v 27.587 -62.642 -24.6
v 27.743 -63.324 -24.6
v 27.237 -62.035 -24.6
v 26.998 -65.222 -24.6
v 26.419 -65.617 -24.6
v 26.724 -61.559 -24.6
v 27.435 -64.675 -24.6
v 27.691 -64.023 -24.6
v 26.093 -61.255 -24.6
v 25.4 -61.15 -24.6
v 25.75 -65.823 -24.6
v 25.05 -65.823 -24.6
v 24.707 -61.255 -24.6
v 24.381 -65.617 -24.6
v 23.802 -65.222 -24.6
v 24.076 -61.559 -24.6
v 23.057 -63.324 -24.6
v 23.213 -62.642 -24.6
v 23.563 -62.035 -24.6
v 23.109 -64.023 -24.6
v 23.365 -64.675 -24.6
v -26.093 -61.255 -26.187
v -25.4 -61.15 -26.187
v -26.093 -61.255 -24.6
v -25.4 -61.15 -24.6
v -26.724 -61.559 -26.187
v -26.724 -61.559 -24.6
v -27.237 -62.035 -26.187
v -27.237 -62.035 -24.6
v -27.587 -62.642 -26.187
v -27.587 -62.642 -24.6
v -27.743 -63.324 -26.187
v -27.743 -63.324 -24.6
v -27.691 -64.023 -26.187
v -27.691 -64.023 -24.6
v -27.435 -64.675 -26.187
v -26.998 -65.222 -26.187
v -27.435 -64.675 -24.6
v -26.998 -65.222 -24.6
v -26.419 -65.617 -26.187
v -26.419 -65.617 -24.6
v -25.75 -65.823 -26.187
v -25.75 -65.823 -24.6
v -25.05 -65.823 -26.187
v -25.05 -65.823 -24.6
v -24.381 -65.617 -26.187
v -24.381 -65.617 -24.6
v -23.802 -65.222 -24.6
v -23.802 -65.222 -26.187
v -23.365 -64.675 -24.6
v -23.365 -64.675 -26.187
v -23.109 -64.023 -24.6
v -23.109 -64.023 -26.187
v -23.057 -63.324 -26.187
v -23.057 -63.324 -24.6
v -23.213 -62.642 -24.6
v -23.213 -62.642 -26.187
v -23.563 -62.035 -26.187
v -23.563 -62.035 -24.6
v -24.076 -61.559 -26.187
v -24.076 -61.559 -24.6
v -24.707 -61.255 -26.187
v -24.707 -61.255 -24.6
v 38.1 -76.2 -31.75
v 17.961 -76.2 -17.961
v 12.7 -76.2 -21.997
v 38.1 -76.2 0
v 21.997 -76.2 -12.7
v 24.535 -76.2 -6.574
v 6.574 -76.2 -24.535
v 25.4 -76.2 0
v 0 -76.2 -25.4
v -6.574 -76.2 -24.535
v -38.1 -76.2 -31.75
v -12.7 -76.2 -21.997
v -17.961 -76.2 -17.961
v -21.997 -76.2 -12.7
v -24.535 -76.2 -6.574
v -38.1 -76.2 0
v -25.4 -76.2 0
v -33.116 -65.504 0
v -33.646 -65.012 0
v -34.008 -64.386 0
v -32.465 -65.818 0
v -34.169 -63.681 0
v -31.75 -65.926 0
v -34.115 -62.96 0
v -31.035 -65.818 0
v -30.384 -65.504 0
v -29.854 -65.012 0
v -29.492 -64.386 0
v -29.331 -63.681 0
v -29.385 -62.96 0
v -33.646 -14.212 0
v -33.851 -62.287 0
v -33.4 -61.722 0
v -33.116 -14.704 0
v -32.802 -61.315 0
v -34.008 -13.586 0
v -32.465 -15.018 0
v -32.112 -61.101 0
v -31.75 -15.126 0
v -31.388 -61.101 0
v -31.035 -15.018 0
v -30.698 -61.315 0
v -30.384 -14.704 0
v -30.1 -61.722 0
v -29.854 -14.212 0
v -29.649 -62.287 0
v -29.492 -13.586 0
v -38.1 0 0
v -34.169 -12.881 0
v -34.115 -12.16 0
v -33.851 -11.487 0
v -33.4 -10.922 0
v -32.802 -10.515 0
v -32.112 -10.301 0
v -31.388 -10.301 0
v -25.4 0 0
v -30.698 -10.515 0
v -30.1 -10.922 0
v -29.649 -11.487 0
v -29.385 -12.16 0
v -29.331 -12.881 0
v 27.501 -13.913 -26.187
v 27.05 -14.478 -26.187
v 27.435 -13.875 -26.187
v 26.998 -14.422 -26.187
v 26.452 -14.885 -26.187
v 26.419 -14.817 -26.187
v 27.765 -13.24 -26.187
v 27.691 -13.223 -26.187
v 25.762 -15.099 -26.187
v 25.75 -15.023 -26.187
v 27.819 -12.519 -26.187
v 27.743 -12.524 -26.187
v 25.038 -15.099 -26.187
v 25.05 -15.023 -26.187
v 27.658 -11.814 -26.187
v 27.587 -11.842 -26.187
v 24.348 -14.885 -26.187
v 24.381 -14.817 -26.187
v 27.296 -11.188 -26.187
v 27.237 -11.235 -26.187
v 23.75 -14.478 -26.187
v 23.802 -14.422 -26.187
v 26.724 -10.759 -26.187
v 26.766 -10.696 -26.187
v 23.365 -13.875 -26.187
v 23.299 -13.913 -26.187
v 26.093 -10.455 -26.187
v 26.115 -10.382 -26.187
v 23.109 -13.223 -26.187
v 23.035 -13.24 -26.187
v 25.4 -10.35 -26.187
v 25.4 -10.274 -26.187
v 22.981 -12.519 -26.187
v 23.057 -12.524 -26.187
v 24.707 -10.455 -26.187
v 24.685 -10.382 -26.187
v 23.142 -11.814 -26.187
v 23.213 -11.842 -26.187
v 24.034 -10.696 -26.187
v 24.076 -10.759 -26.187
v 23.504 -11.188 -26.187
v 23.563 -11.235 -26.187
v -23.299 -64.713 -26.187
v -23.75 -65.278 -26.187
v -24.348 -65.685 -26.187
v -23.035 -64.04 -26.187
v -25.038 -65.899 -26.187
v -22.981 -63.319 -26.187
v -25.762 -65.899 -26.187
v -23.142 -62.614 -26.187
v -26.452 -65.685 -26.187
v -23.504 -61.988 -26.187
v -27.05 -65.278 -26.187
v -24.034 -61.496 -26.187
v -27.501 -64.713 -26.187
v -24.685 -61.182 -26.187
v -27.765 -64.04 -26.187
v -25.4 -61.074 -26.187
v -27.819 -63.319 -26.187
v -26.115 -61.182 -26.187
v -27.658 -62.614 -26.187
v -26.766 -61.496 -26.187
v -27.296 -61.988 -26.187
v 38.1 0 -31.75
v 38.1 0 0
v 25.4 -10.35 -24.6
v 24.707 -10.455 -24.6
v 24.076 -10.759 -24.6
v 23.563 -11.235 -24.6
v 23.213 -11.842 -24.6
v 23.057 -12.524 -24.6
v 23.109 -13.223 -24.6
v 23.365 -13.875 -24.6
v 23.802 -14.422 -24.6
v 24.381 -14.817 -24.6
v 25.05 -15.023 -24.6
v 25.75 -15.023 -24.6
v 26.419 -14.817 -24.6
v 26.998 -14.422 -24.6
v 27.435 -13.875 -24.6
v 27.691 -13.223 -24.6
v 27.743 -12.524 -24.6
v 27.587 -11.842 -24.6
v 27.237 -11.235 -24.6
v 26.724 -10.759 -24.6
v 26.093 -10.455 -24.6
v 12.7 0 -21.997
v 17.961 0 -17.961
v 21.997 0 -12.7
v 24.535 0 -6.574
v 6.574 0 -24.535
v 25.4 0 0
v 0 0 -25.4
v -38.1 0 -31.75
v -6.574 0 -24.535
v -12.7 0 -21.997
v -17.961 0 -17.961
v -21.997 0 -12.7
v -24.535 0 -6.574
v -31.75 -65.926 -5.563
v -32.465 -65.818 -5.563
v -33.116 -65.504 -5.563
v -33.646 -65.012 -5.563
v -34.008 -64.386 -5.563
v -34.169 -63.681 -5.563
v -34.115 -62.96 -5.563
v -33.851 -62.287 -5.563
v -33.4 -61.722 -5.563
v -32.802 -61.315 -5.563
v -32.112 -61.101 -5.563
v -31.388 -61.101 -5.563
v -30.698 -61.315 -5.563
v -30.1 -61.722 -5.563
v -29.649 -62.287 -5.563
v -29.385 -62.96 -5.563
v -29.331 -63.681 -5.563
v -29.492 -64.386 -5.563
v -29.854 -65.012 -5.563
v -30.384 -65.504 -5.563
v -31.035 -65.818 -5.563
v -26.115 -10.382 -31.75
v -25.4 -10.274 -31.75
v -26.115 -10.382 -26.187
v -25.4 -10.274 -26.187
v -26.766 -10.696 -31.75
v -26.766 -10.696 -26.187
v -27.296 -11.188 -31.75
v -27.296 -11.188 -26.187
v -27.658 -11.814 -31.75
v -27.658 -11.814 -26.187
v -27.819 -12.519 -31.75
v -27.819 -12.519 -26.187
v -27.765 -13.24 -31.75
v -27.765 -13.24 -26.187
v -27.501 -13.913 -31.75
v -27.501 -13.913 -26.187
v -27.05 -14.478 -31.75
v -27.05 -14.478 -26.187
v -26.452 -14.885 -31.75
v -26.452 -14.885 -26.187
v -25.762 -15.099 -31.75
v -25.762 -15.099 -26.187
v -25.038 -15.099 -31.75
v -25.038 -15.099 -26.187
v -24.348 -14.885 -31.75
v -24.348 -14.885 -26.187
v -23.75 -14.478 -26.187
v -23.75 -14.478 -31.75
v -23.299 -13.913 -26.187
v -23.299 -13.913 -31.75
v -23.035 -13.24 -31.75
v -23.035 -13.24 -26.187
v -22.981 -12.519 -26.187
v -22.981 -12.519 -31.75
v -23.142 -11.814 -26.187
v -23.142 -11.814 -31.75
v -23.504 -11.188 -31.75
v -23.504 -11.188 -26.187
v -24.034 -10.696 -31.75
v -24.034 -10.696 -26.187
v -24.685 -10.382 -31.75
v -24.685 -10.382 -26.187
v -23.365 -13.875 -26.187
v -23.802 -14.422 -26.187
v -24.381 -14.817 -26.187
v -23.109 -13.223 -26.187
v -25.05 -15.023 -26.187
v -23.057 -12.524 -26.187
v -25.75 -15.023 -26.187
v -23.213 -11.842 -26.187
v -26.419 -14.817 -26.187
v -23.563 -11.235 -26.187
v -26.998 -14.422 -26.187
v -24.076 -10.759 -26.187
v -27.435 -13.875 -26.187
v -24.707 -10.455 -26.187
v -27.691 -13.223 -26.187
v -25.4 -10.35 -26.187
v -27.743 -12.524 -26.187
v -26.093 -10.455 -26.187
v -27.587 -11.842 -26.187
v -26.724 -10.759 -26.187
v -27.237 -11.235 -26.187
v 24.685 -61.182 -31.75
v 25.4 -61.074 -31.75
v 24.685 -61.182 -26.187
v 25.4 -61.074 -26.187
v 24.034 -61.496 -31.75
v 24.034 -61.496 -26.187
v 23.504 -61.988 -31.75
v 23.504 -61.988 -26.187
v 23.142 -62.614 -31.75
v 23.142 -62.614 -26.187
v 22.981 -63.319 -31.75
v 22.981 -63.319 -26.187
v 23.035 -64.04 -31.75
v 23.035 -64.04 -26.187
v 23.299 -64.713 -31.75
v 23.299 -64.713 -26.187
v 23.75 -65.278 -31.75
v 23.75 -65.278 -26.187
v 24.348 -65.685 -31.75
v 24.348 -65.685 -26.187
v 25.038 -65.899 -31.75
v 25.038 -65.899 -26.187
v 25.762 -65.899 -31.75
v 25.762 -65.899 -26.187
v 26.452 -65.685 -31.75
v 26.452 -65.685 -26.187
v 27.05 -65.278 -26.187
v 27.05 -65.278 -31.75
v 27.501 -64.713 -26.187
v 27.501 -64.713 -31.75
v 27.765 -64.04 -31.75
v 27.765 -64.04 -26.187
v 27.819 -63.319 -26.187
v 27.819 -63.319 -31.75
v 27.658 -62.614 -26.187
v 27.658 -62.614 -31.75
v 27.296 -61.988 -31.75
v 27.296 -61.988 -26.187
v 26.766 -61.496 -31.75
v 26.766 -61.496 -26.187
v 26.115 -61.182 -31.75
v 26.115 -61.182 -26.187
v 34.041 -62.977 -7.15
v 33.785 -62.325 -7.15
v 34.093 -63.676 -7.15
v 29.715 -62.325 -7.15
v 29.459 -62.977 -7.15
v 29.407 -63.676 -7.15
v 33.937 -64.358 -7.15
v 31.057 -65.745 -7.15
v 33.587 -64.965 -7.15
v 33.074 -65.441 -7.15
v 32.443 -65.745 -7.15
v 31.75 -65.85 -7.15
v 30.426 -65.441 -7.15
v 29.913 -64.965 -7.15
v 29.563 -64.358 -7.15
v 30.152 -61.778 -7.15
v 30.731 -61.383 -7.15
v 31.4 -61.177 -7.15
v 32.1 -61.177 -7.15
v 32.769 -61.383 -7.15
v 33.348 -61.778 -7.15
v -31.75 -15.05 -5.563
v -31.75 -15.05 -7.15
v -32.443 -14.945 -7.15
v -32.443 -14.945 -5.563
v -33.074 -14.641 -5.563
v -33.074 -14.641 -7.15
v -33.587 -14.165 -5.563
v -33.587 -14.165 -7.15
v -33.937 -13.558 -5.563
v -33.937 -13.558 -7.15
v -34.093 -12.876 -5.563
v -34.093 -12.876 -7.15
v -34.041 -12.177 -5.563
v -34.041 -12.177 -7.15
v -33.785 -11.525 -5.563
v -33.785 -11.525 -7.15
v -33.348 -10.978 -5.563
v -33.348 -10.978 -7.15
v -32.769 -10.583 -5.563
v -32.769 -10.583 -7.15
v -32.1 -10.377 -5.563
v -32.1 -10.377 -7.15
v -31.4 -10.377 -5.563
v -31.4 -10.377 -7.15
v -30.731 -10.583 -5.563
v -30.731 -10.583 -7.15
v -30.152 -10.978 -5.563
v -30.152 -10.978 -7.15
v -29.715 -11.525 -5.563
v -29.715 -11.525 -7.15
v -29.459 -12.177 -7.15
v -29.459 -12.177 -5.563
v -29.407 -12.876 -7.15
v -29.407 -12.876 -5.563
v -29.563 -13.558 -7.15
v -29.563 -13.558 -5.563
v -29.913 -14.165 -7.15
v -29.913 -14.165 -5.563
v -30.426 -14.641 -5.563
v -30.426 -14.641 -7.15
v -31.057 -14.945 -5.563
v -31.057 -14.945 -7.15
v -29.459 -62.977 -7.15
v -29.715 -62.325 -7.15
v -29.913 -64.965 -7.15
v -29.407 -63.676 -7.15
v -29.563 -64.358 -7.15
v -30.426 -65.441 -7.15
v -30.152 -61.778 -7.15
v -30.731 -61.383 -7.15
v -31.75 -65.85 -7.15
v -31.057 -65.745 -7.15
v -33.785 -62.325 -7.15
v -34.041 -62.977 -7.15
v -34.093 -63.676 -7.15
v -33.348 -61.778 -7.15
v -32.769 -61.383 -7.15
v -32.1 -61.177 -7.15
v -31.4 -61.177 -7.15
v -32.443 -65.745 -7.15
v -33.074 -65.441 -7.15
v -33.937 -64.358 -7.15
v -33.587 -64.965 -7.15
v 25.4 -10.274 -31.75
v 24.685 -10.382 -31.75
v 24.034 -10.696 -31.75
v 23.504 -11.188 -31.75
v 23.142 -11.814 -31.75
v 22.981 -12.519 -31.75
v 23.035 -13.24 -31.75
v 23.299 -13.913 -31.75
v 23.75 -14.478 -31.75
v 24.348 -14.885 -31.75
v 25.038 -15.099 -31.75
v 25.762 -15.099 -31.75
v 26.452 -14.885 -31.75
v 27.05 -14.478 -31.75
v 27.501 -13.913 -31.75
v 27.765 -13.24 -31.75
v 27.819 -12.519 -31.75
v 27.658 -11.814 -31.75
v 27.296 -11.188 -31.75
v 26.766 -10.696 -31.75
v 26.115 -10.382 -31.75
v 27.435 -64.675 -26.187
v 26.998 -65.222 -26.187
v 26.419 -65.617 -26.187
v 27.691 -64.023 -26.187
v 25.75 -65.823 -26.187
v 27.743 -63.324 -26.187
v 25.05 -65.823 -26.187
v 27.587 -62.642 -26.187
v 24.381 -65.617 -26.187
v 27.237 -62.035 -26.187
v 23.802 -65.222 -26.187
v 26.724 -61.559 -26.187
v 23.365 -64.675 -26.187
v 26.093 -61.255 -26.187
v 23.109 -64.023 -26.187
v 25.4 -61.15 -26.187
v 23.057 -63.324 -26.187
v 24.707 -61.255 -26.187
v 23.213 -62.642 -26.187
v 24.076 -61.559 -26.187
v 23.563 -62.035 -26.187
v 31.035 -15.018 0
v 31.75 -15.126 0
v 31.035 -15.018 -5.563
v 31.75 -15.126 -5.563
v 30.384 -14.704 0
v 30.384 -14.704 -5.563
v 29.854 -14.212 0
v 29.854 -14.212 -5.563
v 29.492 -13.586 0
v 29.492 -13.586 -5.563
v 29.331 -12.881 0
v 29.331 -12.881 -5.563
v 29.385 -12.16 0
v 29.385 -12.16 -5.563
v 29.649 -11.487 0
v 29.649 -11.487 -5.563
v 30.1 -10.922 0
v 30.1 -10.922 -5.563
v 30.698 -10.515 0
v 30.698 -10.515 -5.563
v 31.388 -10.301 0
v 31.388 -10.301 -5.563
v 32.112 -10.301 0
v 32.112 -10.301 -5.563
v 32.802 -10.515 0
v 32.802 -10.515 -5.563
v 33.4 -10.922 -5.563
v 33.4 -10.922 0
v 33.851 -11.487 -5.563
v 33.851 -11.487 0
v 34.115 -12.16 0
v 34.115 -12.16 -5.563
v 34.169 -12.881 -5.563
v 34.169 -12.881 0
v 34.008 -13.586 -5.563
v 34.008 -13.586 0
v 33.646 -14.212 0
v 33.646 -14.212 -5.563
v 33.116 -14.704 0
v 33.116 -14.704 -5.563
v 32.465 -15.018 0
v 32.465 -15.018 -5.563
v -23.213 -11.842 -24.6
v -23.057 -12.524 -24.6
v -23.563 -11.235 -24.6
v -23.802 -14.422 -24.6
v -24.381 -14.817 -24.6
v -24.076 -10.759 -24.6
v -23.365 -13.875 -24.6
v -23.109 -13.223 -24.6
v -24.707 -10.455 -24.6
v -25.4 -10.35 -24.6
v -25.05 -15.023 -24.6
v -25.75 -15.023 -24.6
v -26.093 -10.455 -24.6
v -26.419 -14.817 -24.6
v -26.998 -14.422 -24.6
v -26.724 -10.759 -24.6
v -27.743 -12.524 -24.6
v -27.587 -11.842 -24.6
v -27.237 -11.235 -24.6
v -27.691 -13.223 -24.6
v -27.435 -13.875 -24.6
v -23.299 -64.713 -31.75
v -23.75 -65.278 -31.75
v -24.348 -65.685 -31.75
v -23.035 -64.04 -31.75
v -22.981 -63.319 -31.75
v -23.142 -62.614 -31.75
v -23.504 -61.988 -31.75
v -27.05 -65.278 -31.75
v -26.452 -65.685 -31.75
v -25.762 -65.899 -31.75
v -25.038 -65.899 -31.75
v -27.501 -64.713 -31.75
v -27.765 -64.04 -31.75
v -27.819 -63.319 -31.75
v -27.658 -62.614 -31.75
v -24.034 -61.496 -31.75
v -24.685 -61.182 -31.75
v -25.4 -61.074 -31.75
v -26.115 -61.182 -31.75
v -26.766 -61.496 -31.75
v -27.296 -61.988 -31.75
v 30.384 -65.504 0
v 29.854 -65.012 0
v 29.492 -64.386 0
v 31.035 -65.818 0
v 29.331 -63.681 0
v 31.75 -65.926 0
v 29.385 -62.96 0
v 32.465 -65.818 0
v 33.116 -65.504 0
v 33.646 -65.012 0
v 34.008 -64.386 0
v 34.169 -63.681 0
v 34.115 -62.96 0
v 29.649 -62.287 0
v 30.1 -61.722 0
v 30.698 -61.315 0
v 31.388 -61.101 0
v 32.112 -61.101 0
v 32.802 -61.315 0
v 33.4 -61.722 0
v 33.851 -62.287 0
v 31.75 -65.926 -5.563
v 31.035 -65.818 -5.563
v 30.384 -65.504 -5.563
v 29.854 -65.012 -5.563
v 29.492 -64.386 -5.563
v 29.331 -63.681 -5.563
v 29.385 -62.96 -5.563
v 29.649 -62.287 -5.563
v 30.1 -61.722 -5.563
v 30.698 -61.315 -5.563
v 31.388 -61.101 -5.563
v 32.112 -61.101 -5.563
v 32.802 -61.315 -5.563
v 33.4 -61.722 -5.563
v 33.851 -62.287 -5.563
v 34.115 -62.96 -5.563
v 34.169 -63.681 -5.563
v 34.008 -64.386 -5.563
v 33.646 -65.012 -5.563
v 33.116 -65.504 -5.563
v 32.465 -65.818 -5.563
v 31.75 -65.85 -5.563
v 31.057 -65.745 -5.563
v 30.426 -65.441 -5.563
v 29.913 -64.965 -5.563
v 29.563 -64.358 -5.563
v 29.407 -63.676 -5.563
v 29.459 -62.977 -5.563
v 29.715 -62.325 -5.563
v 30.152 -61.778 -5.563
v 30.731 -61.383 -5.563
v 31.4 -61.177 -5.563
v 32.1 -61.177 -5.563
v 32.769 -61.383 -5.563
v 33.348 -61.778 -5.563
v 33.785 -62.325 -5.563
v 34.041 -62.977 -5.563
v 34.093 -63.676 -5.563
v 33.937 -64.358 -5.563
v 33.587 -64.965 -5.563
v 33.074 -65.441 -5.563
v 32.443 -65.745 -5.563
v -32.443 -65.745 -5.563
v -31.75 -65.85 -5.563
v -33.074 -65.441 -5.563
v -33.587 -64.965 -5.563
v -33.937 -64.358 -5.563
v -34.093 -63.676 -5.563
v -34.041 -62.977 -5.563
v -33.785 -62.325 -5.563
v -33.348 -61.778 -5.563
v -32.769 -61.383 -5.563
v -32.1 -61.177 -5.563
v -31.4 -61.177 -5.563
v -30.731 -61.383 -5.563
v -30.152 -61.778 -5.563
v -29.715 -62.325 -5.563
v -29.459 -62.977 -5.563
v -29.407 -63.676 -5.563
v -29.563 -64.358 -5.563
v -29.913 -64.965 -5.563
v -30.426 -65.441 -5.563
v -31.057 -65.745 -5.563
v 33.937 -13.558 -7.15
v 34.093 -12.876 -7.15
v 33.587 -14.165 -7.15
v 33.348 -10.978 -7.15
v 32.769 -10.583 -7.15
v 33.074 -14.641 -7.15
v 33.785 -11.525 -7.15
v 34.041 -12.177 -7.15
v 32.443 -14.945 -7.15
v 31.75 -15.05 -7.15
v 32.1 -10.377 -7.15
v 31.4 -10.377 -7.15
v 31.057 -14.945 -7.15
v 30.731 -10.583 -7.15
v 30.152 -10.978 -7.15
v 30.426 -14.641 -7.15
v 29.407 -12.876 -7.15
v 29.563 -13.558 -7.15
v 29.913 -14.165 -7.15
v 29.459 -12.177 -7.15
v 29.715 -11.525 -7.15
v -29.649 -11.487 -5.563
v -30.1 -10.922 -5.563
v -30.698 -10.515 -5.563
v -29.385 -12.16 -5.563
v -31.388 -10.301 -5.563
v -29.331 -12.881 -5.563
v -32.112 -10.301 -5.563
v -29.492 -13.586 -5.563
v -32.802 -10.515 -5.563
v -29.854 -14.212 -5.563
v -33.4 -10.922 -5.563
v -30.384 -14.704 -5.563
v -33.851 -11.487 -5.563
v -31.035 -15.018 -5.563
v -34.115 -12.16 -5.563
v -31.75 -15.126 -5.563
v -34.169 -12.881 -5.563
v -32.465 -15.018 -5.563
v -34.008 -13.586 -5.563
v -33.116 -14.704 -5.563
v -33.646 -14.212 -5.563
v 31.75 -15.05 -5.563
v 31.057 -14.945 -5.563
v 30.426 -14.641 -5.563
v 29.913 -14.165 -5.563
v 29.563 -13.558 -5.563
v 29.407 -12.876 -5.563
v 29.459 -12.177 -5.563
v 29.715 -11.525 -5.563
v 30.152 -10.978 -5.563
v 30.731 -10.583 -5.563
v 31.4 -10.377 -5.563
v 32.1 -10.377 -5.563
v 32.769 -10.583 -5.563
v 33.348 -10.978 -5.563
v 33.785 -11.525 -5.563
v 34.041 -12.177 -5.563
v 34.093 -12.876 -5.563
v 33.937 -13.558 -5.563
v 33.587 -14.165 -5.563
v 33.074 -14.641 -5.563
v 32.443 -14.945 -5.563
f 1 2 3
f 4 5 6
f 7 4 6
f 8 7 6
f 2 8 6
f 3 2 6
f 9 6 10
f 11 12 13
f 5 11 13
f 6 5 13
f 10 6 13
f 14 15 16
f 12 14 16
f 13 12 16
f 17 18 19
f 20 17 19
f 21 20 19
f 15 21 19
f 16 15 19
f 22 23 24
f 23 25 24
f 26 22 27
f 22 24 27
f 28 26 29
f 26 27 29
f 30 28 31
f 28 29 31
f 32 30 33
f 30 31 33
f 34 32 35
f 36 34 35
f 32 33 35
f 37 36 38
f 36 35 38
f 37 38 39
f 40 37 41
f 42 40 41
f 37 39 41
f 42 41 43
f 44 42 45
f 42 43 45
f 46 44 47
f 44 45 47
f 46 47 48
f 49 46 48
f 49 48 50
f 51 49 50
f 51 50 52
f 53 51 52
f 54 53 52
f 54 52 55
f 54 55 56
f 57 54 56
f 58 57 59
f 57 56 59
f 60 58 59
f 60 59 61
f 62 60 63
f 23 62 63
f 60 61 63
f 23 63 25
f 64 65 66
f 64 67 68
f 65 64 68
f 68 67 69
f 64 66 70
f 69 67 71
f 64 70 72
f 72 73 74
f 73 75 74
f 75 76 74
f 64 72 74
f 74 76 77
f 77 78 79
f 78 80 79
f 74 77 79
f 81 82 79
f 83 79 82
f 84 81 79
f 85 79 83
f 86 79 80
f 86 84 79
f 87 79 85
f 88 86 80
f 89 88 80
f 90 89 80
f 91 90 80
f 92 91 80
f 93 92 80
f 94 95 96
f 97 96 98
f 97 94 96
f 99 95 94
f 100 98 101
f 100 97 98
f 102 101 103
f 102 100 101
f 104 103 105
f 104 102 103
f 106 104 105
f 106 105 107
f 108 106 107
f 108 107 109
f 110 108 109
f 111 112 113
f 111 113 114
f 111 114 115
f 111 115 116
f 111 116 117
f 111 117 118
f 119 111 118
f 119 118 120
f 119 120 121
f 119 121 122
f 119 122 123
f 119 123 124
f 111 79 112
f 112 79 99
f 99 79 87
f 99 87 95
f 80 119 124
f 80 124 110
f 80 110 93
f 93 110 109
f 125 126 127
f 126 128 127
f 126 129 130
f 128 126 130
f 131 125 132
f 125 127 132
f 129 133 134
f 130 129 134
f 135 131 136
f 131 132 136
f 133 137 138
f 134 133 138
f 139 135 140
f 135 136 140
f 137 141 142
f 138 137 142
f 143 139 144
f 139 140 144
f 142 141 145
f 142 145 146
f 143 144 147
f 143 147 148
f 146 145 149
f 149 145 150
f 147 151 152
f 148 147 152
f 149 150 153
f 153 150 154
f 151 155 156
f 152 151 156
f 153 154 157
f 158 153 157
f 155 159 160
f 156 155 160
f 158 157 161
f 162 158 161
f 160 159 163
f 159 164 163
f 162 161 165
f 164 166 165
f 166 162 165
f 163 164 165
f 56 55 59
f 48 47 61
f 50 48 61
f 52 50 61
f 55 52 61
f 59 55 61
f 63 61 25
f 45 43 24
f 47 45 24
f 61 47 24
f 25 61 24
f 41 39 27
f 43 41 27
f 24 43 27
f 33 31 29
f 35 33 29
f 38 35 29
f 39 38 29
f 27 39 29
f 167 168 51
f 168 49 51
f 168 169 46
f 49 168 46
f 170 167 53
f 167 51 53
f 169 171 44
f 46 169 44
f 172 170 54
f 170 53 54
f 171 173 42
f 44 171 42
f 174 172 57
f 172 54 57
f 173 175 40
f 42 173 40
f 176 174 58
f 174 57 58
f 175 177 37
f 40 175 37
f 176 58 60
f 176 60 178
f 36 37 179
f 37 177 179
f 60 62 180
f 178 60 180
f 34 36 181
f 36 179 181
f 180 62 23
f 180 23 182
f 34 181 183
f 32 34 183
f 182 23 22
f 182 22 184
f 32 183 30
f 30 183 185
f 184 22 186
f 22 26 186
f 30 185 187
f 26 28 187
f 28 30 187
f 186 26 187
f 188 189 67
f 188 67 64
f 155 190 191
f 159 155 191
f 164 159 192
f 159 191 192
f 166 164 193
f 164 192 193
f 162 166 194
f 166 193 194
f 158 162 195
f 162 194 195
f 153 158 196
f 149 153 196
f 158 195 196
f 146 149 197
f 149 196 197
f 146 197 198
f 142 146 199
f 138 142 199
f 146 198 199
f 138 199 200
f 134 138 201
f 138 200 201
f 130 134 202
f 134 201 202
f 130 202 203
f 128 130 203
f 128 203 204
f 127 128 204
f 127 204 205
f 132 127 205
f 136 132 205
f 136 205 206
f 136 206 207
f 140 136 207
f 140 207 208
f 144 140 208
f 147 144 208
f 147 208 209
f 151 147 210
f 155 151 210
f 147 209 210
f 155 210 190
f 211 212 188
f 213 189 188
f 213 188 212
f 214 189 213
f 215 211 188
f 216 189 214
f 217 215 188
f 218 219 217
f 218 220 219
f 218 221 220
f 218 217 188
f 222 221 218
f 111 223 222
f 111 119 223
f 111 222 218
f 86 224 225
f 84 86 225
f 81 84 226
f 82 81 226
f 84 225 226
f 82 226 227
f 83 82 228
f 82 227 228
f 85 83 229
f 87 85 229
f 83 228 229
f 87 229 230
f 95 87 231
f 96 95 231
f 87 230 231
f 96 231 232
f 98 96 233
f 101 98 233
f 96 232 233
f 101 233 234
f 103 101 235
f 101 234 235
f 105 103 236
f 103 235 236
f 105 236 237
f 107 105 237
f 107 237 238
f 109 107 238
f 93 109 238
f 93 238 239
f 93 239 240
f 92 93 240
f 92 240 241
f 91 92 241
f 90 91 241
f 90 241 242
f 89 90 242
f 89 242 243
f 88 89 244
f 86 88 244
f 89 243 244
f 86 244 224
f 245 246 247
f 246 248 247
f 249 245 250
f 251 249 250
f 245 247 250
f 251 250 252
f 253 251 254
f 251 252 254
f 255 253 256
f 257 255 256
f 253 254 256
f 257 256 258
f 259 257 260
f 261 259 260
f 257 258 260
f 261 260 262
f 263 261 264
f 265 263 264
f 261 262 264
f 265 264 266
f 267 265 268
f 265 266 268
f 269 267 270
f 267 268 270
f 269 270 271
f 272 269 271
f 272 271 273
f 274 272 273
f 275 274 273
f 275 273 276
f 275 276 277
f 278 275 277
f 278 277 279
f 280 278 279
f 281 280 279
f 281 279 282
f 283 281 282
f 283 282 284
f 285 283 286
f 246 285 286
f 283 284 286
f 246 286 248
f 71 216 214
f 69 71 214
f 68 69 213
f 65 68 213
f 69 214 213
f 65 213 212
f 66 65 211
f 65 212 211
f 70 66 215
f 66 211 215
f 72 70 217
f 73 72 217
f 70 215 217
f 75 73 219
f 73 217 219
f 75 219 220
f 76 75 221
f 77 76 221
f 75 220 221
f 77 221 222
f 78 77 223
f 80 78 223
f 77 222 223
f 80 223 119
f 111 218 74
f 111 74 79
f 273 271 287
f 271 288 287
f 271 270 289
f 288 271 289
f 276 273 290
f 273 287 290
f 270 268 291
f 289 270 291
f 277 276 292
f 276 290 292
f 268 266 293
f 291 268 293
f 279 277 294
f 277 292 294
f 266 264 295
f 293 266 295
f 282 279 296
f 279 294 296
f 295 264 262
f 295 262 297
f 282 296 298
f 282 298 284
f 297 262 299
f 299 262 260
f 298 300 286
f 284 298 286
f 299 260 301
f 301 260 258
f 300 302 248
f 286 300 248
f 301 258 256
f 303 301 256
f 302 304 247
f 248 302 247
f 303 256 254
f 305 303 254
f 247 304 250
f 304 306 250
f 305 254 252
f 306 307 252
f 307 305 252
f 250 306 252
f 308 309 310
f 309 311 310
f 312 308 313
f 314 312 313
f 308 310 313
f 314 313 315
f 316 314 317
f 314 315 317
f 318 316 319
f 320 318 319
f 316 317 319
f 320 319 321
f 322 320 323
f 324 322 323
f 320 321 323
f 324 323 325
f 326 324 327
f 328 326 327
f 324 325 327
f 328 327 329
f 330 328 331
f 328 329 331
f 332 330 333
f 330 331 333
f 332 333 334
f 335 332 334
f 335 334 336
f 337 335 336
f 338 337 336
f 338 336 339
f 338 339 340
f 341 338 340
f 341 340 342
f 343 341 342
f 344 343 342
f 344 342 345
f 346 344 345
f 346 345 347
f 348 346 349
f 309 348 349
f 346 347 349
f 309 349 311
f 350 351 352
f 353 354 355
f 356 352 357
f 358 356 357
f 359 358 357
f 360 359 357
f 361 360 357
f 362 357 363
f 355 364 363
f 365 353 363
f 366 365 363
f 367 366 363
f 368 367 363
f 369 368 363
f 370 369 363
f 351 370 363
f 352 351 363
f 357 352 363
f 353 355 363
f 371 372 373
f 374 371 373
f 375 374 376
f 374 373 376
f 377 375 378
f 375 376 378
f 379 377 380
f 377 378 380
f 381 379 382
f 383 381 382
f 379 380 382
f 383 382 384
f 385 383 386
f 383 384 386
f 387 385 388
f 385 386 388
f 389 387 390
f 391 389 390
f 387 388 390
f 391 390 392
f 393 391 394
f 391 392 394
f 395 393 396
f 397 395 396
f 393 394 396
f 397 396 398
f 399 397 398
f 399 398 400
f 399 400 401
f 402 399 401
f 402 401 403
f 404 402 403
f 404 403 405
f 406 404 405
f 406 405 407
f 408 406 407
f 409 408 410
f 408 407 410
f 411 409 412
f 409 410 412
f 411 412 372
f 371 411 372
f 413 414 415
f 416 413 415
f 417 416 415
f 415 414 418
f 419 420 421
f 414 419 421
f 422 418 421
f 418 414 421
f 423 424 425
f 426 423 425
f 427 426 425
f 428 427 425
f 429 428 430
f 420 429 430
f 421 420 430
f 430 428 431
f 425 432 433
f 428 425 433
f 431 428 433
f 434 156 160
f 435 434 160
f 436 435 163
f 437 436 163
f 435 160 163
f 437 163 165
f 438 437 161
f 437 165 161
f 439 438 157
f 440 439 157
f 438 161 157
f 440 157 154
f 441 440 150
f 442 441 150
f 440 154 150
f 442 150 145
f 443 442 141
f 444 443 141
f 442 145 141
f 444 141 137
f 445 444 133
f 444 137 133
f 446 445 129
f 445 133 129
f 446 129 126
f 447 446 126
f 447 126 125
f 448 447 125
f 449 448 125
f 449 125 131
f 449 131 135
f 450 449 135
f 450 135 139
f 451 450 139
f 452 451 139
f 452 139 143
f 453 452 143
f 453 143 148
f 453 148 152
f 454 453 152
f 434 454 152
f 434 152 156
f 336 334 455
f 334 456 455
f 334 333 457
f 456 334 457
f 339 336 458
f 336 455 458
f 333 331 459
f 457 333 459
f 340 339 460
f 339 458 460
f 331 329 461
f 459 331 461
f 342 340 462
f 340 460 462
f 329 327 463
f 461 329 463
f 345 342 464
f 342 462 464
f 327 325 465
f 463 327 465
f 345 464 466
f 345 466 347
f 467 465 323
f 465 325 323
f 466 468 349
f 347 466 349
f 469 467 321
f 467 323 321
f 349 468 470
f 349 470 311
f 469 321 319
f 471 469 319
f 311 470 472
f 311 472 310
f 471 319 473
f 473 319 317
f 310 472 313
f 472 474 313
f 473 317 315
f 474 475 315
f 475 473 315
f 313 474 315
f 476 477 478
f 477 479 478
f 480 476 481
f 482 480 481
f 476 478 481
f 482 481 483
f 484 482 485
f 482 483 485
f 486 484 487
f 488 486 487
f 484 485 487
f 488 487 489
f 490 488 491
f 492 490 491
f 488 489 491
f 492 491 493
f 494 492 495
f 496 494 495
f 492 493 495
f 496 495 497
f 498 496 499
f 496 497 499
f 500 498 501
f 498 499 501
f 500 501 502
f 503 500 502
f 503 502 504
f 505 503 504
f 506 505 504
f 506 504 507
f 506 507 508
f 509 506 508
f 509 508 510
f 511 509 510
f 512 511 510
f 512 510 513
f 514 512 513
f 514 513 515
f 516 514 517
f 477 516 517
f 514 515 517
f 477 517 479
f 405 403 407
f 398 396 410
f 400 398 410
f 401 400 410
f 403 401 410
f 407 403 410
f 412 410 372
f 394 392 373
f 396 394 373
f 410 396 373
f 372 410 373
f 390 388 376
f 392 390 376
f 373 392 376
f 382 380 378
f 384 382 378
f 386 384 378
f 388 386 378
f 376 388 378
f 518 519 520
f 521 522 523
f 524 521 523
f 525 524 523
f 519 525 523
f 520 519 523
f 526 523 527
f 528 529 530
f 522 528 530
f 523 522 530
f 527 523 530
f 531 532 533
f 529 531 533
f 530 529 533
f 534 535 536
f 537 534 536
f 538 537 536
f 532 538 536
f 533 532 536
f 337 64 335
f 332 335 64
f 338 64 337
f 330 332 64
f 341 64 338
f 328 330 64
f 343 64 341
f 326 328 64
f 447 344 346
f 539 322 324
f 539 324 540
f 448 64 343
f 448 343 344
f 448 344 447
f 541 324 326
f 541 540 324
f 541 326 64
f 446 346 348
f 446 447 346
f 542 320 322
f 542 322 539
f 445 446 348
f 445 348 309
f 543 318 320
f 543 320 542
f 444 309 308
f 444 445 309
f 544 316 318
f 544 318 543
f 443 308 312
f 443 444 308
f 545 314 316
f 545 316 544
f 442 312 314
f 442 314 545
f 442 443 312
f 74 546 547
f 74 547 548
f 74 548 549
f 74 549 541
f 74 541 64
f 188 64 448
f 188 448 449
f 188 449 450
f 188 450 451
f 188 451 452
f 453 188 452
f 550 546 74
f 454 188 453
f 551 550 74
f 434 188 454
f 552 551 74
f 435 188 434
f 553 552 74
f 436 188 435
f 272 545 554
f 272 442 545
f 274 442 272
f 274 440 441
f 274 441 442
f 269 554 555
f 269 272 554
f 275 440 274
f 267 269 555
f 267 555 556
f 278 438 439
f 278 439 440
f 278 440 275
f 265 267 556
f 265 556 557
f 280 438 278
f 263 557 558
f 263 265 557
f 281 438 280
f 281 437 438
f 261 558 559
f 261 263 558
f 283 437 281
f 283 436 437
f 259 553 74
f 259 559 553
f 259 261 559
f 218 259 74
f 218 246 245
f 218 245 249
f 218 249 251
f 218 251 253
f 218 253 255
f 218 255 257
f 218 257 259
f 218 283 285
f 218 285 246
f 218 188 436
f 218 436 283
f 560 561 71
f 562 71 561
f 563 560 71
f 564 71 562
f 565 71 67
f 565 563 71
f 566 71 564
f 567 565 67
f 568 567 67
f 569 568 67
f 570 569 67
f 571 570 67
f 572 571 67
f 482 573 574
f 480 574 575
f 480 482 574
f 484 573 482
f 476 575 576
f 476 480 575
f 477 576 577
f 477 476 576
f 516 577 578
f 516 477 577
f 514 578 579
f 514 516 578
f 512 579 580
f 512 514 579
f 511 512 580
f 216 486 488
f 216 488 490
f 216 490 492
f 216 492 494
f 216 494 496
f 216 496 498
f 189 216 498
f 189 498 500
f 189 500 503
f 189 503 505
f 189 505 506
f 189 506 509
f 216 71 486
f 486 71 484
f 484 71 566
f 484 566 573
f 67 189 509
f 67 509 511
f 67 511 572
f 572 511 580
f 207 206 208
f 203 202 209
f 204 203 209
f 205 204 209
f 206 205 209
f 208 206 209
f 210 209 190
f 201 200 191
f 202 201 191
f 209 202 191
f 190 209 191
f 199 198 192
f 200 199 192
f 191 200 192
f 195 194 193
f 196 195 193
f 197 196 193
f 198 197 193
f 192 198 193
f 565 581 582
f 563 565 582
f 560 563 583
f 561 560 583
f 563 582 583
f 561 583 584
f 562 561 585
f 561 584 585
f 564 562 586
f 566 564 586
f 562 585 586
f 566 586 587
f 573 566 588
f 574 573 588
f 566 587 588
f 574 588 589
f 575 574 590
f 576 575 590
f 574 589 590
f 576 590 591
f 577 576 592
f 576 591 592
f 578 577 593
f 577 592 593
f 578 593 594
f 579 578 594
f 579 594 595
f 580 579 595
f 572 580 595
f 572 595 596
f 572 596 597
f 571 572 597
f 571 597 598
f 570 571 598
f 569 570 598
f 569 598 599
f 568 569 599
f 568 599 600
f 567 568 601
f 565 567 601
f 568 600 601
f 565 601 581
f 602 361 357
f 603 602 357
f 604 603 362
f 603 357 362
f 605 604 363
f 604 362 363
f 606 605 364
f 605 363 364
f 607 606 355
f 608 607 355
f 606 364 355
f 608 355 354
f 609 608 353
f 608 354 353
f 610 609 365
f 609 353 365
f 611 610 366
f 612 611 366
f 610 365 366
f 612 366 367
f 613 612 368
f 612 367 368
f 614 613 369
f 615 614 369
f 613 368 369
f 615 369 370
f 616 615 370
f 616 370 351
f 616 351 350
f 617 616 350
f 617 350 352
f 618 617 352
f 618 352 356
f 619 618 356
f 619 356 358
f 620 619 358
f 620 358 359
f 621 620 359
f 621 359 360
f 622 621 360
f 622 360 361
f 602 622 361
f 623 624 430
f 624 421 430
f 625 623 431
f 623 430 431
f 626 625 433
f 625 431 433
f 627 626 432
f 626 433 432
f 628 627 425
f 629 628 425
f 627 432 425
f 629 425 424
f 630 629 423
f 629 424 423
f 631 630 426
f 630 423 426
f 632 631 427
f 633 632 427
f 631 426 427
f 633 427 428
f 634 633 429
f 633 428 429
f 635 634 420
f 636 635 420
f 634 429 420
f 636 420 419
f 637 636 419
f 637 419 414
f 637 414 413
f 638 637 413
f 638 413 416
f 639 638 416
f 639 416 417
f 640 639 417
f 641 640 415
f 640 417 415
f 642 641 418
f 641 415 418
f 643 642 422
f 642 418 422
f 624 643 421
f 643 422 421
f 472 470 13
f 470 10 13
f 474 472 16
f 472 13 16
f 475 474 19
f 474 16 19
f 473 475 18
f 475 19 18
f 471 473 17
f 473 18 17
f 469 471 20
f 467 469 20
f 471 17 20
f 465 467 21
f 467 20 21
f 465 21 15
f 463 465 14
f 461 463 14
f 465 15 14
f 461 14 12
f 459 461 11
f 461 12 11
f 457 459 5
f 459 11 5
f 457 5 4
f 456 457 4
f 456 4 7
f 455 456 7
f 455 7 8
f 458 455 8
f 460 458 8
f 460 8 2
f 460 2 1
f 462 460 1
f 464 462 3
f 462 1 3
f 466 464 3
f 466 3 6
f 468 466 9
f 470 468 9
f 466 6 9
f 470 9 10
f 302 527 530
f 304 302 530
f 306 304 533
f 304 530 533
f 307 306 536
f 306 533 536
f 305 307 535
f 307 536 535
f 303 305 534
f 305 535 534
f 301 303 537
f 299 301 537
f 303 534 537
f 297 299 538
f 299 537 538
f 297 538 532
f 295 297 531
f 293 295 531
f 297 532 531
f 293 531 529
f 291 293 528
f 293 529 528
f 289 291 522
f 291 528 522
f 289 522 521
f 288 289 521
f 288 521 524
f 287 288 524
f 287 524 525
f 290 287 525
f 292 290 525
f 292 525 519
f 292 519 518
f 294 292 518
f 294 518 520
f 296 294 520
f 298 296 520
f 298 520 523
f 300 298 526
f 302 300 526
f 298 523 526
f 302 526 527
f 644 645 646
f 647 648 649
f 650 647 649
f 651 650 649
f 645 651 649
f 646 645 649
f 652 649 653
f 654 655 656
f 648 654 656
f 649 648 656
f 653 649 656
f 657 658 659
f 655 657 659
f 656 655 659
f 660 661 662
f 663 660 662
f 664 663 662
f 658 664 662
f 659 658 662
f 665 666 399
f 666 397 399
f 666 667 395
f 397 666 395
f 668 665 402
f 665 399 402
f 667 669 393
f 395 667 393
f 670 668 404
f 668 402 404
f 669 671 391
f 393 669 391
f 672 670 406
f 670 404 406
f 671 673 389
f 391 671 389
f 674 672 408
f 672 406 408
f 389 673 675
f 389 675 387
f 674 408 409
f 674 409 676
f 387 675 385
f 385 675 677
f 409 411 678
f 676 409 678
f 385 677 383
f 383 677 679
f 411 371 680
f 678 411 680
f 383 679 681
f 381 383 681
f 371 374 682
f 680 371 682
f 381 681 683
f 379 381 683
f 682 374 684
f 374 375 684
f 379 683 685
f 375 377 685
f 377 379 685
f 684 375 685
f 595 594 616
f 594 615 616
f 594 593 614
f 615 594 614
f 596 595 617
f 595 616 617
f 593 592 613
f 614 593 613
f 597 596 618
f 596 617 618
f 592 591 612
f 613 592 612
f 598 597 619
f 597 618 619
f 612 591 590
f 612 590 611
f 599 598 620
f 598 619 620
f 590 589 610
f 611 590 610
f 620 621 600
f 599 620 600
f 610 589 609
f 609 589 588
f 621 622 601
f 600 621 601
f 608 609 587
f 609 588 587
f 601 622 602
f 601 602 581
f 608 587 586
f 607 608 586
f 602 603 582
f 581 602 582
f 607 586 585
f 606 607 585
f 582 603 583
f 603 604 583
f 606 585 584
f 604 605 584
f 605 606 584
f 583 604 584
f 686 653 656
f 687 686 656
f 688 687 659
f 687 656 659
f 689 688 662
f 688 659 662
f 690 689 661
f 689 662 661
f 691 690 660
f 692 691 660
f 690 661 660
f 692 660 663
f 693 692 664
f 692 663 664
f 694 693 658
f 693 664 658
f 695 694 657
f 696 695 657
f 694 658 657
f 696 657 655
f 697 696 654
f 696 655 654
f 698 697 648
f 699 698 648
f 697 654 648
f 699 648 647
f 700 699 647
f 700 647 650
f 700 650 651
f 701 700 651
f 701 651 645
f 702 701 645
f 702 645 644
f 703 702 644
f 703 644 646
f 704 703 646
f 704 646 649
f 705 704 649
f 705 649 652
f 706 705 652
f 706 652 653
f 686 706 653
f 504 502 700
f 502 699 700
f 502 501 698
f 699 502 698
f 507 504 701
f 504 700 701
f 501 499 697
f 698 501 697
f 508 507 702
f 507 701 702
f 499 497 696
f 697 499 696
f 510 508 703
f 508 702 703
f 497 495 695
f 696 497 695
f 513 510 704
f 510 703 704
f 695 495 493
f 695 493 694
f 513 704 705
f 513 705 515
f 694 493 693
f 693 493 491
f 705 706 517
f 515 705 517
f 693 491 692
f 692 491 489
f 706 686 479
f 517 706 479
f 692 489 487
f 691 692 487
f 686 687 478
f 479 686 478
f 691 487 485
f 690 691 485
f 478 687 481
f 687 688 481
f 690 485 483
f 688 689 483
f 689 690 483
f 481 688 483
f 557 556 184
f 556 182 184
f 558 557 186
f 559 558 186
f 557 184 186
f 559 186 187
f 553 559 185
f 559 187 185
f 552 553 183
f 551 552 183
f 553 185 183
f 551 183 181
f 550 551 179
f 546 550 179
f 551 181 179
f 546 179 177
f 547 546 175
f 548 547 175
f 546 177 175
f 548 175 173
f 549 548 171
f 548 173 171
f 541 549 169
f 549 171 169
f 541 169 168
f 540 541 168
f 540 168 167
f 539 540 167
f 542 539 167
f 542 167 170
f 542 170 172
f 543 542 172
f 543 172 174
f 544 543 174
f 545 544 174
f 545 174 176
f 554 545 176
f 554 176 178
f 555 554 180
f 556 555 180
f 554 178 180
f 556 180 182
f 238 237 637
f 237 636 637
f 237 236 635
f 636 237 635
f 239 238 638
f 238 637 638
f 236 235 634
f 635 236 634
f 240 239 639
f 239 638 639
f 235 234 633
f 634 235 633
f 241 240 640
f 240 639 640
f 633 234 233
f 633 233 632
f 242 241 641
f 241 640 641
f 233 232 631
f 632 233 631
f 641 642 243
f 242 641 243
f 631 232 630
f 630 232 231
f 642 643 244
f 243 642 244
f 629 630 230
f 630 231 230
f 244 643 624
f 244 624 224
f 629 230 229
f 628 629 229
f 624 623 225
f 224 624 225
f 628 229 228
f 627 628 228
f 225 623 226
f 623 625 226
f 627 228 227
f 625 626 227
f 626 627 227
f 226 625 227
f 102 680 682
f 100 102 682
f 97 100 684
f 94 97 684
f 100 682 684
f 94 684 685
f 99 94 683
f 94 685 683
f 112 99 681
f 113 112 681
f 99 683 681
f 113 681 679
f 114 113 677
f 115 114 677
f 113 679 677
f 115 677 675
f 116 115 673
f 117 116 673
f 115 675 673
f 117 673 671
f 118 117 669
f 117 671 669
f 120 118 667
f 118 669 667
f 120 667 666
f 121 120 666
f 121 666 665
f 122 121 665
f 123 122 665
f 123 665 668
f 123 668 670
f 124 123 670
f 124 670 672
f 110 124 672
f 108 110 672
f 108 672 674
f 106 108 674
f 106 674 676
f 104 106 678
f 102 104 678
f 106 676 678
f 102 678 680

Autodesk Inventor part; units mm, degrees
ref_plane "YZ Plane" through (0, 0, 0) normal (1, 0, 0) x (0, 1, 0)
ref_plane "XZ Plane" through (0, 0, 0) normal (0, 1, 0) x (-1, 0, 0)
ref_plane "XY Plane" through (0, 0, 0) normal (0, 0, 1) x (1, 0, 0)
sketch "Sketch18" plane through (0, 0, 0) normal (0, 1, 0) x (-1, 0, 0)
  arc A0 (-25.4, 0) -> (25.4, 0) centre (0, 0) ccw
  line L0 (-38.1, 0) -> (-38.1, -31.75)
  line L1 (-38.1, -31.75) -> (38.1, -31.75)
  line L2 (38.1, -31.75) -> (38.1, 0)
  line L3 (38.1, 31.75) -> (-38.1, -31.75) construction
  line L4 (-38.1, 31.75) -> (38.1, -31.75) construction
  line L5 (38.1, 0) -> (25.4, 0)
  line L6 (-25.4, 0) -> (-38.1, 0)
  dimension "d78" = 50.8
  dimension "d79" = 6.35
  dimension "d80" = 12.7
extrude "Extrusion9" add sketch "Sketch18" against normal blind 76.2
sketch "Sketch19" plane through (-38.1, 0, 0) normal (0, 0, 1) x (1, 0, 0)
  line L0 (0, 0) -> (0, -76.2) projected
  line L1 (12.7, 0) -> (12.7, -76.2) projected
  line L2 (63.5, 0) -> (63.5, -76.2) projected
  line L3 (76.2, 0) -> (76.2, -76.2) projected
  line L4 (76.2, -76.2) -> (63.5, -76.2) projected
  line L5 (12.7, -76.2) -> (0, -76.2) projected
  line L6 (0, 0) -> (12.7, 0) projected
  line L7 (63.5, 0) -> (76.2, 0) projected
  line L8 (6.35, -63.5) -> (69.85, -63.5) construction
  line L9 (69.85, -63.5) -> (69.85, -12.7) construction
  line L10 (69.85, -12.7) -> (6.35, -12.7) construction
  line L11 (6.35, -12.7) -> (6.35, -63.5) construction
  line L12 (63.5, -76.2) -> (12.7, -76.2) construction
  line L13 (12.7, 0) -> (63.5, 0) construction
  point P0 (38.1, 0)
  dimension "d83" = 6.35
  dimension "d84" = 6.35
  dimension "d85" = 12.7
  dimension "d86" = 12.7
hole "Hole3" at (-31.75, -12.7, 0) at (31.75, -12.7, 0) at (31.75, -63.5, 0) at (-31.75, -63.5, 0) direction (0, 0, -1) diameter 4.699 depth 7.1501 counterbore diameter 4.8514 counterbore depth 5.5626
sketch "Sketch20" plane through (38.1, 0, -31.75) normal (0, 0, -1) x (-1, 0, 0)
  line L0 (76.2, 0) -> (76.2, -76.2) projected
  line L1 (0, 0) -> (76.2, 0) projected
  line L2 (0, 0) -> (0, -76.2) projected
  line L3 (76.2, -76.2) -> (0, -76.2) projected
  line L4 (12.7, -63.5) -> (63.5, -63.5) construction
  line L5 (63.5, -63.5) -> (63.5, -12.7) construction
  line L6 (63.5, -12.7) -> (12.7, -12.7) construction
  line L7 (12.7, -12.7) -> (12.7, -63.5) construction
  line L8 (12.7, -63.5) -> (63.5, -12.7) construction
  line L9 (63.5, -63.5) -> (12.7, -12.7) construction
  line L10 (0, 0) -> (0, -76.2) construction
  point P0 (38.1, 0)
  point P1 (38.1, -38.1)
  dimension "d94" = 12.7
  dimension "d95" = 12.7
  dimension "d96" = 12.7
  dimension "d97" = 12.7
hole "Hole4" at (25.4, -12.7, -31.75) at (-25.4, -12.7, -31.75) at (-25.4, -63.5, -31.75) at (25.4, -63.5, -31.75) direction (0, 0, 1) diameter 4.699 depth 7.1501 counterbore diameter 4.8514 counterbore depth 5.5626
equation "\"d78\" = legDiameter"
equation "\"d81\" = legPartHeight"
equation "\"legDiameter\" = 50.8"
equation "\"legWalThickness\" = 3.175"
equation "\"legPartHeight\" = 76.2"
properties part number "clampForMeadeTripodLeg"
